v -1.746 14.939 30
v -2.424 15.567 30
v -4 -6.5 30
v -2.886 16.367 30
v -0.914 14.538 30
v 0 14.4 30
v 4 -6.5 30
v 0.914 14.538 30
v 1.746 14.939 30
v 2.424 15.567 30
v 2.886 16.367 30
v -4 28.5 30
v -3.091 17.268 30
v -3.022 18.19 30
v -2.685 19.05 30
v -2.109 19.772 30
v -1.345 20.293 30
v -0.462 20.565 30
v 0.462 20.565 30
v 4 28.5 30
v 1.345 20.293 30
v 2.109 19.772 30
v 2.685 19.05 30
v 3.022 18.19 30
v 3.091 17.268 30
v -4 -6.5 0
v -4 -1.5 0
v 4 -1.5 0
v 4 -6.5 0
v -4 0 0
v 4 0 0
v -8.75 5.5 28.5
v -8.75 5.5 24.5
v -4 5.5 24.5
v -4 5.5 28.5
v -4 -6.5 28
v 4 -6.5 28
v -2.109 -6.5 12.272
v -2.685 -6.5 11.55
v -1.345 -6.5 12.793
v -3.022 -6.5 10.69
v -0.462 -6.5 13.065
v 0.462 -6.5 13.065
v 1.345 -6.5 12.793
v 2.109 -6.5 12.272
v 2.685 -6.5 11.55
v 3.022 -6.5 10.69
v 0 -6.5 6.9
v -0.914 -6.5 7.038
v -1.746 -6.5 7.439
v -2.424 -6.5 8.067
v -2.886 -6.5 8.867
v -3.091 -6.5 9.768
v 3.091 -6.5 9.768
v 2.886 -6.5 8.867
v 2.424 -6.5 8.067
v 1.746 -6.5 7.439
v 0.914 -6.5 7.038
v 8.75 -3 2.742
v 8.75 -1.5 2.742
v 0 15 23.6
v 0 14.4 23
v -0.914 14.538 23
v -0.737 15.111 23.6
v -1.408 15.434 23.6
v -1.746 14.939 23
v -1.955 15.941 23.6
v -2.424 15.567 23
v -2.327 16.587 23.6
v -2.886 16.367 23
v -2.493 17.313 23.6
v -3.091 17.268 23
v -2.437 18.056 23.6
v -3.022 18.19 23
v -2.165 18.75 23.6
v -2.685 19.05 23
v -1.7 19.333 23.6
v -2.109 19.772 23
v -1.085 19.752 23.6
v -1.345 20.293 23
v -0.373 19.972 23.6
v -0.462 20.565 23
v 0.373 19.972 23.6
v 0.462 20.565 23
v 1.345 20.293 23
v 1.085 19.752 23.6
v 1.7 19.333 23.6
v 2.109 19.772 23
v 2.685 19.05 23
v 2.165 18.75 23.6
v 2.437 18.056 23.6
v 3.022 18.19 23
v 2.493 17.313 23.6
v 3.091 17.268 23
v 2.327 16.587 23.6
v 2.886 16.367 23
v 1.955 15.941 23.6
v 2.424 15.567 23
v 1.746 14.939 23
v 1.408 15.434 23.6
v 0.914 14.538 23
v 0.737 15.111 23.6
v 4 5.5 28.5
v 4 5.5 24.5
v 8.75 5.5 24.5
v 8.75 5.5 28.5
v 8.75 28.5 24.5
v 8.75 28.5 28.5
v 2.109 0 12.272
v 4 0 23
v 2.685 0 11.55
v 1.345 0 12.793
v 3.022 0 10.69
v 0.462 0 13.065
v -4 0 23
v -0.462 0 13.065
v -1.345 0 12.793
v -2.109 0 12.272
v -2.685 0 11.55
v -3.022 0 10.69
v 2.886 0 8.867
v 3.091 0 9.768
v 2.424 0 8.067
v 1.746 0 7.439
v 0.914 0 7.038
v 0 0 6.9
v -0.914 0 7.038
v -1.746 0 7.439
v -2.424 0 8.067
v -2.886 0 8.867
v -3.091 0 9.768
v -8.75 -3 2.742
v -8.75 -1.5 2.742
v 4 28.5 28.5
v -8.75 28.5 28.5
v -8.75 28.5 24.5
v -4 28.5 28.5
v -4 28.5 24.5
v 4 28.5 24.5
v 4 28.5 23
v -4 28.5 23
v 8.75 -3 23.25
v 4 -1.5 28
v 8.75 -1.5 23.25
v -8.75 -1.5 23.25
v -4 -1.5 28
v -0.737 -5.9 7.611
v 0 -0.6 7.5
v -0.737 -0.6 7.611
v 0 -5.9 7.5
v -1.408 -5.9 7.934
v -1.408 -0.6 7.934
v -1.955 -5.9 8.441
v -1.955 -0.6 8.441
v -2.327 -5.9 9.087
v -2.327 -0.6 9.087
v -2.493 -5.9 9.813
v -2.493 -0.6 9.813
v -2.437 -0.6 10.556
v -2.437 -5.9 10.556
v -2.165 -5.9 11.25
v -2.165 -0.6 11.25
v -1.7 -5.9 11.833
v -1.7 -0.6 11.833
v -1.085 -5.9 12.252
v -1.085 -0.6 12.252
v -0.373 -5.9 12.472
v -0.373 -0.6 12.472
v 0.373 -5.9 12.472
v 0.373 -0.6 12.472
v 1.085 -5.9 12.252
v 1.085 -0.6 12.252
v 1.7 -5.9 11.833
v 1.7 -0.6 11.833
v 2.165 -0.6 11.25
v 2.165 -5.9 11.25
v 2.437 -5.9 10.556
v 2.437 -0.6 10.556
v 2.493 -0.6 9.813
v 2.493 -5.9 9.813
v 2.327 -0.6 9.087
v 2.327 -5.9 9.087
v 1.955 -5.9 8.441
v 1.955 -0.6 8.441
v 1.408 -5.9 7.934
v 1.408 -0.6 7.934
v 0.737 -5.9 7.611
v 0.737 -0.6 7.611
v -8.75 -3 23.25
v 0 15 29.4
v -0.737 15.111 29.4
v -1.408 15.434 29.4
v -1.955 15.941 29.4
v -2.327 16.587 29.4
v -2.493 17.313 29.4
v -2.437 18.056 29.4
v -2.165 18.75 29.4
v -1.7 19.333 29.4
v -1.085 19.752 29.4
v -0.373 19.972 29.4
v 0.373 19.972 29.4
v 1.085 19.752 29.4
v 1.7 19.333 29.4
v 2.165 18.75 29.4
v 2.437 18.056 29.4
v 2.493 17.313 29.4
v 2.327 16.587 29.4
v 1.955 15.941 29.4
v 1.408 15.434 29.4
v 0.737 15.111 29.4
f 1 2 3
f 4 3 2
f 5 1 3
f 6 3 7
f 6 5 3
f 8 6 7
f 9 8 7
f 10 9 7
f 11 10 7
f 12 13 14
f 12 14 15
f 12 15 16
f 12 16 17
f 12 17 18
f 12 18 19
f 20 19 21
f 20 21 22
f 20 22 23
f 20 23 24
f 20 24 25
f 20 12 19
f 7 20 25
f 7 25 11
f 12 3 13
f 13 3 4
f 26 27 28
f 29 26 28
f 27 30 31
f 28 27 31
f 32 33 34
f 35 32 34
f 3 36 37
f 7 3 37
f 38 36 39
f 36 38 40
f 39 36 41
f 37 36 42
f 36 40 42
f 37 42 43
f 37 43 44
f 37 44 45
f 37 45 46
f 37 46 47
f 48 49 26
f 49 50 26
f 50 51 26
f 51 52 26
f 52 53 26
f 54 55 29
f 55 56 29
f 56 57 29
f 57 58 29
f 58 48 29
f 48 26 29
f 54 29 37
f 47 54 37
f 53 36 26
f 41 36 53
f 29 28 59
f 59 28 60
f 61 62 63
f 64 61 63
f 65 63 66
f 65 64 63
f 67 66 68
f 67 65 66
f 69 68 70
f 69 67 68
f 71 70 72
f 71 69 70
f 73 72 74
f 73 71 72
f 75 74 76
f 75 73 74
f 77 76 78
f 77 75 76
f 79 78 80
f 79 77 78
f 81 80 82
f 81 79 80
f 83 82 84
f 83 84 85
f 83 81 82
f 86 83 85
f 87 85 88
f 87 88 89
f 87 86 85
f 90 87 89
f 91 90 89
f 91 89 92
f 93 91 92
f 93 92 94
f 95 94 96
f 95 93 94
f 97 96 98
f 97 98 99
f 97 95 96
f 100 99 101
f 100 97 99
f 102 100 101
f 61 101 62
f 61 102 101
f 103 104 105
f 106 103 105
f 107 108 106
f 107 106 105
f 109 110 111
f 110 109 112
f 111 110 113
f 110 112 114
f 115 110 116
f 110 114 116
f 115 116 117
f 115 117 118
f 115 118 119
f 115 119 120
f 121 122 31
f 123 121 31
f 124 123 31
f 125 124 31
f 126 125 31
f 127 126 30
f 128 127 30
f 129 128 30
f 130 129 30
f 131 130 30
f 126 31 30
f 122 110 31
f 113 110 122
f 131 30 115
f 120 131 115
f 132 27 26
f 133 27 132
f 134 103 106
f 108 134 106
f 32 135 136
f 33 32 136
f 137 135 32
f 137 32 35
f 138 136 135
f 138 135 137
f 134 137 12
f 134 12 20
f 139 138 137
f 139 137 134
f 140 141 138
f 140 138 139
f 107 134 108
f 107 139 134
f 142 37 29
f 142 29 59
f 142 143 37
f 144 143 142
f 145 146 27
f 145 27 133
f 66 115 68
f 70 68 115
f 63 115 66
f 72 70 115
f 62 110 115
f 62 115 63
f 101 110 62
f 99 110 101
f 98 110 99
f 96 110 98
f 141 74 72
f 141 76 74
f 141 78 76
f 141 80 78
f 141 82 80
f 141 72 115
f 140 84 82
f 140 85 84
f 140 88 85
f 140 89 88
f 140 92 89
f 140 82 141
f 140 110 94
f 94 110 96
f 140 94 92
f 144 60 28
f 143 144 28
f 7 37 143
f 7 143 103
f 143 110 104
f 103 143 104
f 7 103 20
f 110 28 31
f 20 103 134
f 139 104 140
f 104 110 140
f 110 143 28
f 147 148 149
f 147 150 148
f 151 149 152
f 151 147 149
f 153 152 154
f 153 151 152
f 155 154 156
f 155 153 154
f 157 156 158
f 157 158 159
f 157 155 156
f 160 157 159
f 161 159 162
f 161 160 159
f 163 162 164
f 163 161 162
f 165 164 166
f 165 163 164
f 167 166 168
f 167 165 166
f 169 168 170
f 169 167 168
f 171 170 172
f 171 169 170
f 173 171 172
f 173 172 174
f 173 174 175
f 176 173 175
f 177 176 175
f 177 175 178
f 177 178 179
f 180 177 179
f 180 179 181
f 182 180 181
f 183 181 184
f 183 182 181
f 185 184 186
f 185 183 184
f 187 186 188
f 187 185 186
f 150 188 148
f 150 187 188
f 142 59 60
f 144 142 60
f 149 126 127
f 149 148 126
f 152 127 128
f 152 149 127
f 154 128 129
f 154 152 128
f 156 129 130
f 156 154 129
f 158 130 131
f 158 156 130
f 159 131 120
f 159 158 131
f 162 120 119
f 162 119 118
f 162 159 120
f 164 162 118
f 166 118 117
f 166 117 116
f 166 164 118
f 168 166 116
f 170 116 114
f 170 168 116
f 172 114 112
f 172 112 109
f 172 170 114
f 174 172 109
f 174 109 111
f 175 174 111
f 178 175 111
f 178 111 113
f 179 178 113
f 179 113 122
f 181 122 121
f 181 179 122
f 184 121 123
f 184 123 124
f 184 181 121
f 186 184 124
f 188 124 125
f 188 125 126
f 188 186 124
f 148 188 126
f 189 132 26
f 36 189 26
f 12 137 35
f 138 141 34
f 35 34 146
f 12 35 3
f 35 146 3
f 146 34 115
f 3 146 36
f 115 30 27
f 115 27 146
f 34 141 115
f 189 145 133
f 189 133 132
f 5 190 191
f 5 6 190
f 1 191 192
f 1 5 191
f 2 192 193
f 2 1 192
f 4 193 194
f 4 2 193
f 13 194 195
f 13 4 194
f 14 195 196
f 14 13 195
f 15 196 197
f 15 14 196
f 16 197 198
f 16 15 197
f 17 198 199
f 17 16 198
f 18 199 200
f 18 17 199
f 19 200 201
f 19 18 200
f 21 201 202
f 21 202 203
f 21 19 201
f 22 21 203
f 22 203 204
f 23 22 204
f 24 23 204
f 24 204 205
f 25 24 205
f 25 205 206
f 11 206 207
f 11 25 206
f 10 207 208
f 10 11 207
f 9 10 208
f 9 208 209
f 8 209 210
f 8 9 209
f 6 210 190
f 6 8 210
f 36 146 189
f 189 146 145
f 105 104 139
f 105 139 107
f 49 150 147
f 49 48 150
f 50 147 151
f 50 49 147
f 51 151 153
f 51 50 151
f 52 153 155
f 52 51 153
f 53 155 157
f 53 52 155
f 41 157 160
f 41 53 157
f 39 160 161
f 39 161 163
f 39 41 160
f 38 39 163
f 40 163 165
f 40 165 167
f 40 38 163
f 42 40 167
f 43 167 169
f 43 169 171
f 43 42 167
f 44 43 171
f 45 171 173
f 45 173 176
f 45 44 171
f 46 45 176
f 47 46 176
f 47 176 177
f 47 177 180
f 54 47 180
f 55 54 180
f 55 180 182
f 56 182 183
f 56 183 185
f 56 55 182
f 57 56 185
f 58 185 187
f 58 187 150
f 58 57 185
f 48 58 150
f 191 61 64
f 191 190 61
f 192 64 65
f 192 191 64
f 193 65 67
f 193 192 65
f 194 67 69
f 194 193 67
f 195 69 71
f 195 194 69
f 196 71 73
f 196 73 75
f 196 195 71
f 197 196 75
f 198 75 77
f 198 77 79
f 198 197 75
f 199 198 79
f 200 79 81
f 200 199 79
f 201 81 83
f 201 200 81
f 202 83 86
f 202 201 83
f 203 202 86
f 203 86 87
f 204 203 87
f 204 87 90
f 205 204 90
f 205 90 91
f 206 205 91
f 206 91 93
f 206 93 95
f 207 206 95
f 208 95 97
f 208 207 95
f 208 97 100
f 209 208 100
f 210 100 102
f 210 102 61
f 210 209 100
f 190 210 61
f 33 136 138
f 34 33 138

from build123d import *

# Parameters (mm, degrees)
EXTRUDE_1_DEPTH     = 30
SKETCH_2_W          = 7
SKETCH_2_H          = 35
EXTRUDE_2_DEPTH     = 4
CUT_EXTRUDE_1_DEPTH = 6
SKETCH_4_W          = 17.5
SKETCH_4_H          = 4
EXTRUDE_3_DEPTH     = 23


with BuildPart() as part:
    # Эскиз1 → Бобышка-Вытянуть1 (new body)
    with BuildSketch(Plane.XY):
        Polygon((4, 0), (-4, 0), (-4, -1.5), (-8.75, -1.5), (-8.75, -3), (-4, -6.5), (4, -6.5), (8.75, -3), (8.75, -1.5), (4, -1.5), align=None)
    extrude(amount=EXTRUDE_1_DEPTH)

    # Эскиз2 → Бобышка-Вытянуть2 (add, symmetric)
    with BuildSketch(Plane(origin=(0, 0, 0), x_dir=(0, 0, -1), z_dir=(1, 0, 0))):
        with Locations((-26.5, 11)):
            Rectangle(SKETCH_2_W, SKETCH_2_H)
    extrude(amount=EXTRUDE_2_DEPTH, both=True)

    # Эскиз3 → Вырез-Вытянуть1 (cut, through all)
    with BuildSketch(Plane(origin=(0, -1.5, 0), x_dir=(1, 0, 0), z_dir=(0, 1, 0))):
        Polygon((-4, 0), (-8.75, -2.742413779), (-8.75, 0), align=None)
        Polygon((-4, -28), (-8.75, -23.25), (-8.75, -30), (-4, -30), align=None)
        Polygon((4, -30), (4, -28), (8.75, -23.25), (8.75, -30), align=None)
        Polygon((8.75, 0), (4, 0), (8.75, -2.742413779), align=None)
    extrude(amount=-CUT_EXTRUDE_1_DEPTH, mode=Mode.SUBTRACT)

    # Эскиз4 → Бобышка-Вытянуть3 (add)
    with BuildSketch(Plane(origin=(0, 28.5, 0), x_dir=(1, 0, 0), z_dir=(0, 1, 0))):
        with Locations((0, -26.5)):
            Rectangle(SKETCH_4_W, SKETCH_4_H)
    extrude(amount=-EXTRUDE_3_DEPTH)

    # Эскиз6 → Отверстие обработанное метчиком M61 (revolve, cut)
    with BuildSketch(Plane(origin=(0, -6.5, 10), x_dir=(0, 0, -1), z_dir=(1, 0, 0))):
        Polygon((0, 0), (0, 6.5), (3.1, 6.5), (2.5, 5.9), (2.5, 0.6), (3.1, 0), align=None)
    revolve(axis=Axis((0, -12.85, 10), (0, 1, 0)), mode=Mode.SUBTRACT)

    # Эскиз8 → Отверстие обработанное метчиком M62 (revolve, cut)
    with BuildSketch(Plane(origin=(0, 17.5, 30), x_dir=(0, -1, 0), z_dir=(1, 0, 0))):
        Polygon((0, 0), (0, 7), (3.1, 7), (2.5, 6.4), (2.5, 0.6), (3.1, 0), align=None)
    revolve(axis=Axis((0, 17.5, 36.35), (0, 0, -1)), mode=Mode.SUBTRACT)


solid = part.part
